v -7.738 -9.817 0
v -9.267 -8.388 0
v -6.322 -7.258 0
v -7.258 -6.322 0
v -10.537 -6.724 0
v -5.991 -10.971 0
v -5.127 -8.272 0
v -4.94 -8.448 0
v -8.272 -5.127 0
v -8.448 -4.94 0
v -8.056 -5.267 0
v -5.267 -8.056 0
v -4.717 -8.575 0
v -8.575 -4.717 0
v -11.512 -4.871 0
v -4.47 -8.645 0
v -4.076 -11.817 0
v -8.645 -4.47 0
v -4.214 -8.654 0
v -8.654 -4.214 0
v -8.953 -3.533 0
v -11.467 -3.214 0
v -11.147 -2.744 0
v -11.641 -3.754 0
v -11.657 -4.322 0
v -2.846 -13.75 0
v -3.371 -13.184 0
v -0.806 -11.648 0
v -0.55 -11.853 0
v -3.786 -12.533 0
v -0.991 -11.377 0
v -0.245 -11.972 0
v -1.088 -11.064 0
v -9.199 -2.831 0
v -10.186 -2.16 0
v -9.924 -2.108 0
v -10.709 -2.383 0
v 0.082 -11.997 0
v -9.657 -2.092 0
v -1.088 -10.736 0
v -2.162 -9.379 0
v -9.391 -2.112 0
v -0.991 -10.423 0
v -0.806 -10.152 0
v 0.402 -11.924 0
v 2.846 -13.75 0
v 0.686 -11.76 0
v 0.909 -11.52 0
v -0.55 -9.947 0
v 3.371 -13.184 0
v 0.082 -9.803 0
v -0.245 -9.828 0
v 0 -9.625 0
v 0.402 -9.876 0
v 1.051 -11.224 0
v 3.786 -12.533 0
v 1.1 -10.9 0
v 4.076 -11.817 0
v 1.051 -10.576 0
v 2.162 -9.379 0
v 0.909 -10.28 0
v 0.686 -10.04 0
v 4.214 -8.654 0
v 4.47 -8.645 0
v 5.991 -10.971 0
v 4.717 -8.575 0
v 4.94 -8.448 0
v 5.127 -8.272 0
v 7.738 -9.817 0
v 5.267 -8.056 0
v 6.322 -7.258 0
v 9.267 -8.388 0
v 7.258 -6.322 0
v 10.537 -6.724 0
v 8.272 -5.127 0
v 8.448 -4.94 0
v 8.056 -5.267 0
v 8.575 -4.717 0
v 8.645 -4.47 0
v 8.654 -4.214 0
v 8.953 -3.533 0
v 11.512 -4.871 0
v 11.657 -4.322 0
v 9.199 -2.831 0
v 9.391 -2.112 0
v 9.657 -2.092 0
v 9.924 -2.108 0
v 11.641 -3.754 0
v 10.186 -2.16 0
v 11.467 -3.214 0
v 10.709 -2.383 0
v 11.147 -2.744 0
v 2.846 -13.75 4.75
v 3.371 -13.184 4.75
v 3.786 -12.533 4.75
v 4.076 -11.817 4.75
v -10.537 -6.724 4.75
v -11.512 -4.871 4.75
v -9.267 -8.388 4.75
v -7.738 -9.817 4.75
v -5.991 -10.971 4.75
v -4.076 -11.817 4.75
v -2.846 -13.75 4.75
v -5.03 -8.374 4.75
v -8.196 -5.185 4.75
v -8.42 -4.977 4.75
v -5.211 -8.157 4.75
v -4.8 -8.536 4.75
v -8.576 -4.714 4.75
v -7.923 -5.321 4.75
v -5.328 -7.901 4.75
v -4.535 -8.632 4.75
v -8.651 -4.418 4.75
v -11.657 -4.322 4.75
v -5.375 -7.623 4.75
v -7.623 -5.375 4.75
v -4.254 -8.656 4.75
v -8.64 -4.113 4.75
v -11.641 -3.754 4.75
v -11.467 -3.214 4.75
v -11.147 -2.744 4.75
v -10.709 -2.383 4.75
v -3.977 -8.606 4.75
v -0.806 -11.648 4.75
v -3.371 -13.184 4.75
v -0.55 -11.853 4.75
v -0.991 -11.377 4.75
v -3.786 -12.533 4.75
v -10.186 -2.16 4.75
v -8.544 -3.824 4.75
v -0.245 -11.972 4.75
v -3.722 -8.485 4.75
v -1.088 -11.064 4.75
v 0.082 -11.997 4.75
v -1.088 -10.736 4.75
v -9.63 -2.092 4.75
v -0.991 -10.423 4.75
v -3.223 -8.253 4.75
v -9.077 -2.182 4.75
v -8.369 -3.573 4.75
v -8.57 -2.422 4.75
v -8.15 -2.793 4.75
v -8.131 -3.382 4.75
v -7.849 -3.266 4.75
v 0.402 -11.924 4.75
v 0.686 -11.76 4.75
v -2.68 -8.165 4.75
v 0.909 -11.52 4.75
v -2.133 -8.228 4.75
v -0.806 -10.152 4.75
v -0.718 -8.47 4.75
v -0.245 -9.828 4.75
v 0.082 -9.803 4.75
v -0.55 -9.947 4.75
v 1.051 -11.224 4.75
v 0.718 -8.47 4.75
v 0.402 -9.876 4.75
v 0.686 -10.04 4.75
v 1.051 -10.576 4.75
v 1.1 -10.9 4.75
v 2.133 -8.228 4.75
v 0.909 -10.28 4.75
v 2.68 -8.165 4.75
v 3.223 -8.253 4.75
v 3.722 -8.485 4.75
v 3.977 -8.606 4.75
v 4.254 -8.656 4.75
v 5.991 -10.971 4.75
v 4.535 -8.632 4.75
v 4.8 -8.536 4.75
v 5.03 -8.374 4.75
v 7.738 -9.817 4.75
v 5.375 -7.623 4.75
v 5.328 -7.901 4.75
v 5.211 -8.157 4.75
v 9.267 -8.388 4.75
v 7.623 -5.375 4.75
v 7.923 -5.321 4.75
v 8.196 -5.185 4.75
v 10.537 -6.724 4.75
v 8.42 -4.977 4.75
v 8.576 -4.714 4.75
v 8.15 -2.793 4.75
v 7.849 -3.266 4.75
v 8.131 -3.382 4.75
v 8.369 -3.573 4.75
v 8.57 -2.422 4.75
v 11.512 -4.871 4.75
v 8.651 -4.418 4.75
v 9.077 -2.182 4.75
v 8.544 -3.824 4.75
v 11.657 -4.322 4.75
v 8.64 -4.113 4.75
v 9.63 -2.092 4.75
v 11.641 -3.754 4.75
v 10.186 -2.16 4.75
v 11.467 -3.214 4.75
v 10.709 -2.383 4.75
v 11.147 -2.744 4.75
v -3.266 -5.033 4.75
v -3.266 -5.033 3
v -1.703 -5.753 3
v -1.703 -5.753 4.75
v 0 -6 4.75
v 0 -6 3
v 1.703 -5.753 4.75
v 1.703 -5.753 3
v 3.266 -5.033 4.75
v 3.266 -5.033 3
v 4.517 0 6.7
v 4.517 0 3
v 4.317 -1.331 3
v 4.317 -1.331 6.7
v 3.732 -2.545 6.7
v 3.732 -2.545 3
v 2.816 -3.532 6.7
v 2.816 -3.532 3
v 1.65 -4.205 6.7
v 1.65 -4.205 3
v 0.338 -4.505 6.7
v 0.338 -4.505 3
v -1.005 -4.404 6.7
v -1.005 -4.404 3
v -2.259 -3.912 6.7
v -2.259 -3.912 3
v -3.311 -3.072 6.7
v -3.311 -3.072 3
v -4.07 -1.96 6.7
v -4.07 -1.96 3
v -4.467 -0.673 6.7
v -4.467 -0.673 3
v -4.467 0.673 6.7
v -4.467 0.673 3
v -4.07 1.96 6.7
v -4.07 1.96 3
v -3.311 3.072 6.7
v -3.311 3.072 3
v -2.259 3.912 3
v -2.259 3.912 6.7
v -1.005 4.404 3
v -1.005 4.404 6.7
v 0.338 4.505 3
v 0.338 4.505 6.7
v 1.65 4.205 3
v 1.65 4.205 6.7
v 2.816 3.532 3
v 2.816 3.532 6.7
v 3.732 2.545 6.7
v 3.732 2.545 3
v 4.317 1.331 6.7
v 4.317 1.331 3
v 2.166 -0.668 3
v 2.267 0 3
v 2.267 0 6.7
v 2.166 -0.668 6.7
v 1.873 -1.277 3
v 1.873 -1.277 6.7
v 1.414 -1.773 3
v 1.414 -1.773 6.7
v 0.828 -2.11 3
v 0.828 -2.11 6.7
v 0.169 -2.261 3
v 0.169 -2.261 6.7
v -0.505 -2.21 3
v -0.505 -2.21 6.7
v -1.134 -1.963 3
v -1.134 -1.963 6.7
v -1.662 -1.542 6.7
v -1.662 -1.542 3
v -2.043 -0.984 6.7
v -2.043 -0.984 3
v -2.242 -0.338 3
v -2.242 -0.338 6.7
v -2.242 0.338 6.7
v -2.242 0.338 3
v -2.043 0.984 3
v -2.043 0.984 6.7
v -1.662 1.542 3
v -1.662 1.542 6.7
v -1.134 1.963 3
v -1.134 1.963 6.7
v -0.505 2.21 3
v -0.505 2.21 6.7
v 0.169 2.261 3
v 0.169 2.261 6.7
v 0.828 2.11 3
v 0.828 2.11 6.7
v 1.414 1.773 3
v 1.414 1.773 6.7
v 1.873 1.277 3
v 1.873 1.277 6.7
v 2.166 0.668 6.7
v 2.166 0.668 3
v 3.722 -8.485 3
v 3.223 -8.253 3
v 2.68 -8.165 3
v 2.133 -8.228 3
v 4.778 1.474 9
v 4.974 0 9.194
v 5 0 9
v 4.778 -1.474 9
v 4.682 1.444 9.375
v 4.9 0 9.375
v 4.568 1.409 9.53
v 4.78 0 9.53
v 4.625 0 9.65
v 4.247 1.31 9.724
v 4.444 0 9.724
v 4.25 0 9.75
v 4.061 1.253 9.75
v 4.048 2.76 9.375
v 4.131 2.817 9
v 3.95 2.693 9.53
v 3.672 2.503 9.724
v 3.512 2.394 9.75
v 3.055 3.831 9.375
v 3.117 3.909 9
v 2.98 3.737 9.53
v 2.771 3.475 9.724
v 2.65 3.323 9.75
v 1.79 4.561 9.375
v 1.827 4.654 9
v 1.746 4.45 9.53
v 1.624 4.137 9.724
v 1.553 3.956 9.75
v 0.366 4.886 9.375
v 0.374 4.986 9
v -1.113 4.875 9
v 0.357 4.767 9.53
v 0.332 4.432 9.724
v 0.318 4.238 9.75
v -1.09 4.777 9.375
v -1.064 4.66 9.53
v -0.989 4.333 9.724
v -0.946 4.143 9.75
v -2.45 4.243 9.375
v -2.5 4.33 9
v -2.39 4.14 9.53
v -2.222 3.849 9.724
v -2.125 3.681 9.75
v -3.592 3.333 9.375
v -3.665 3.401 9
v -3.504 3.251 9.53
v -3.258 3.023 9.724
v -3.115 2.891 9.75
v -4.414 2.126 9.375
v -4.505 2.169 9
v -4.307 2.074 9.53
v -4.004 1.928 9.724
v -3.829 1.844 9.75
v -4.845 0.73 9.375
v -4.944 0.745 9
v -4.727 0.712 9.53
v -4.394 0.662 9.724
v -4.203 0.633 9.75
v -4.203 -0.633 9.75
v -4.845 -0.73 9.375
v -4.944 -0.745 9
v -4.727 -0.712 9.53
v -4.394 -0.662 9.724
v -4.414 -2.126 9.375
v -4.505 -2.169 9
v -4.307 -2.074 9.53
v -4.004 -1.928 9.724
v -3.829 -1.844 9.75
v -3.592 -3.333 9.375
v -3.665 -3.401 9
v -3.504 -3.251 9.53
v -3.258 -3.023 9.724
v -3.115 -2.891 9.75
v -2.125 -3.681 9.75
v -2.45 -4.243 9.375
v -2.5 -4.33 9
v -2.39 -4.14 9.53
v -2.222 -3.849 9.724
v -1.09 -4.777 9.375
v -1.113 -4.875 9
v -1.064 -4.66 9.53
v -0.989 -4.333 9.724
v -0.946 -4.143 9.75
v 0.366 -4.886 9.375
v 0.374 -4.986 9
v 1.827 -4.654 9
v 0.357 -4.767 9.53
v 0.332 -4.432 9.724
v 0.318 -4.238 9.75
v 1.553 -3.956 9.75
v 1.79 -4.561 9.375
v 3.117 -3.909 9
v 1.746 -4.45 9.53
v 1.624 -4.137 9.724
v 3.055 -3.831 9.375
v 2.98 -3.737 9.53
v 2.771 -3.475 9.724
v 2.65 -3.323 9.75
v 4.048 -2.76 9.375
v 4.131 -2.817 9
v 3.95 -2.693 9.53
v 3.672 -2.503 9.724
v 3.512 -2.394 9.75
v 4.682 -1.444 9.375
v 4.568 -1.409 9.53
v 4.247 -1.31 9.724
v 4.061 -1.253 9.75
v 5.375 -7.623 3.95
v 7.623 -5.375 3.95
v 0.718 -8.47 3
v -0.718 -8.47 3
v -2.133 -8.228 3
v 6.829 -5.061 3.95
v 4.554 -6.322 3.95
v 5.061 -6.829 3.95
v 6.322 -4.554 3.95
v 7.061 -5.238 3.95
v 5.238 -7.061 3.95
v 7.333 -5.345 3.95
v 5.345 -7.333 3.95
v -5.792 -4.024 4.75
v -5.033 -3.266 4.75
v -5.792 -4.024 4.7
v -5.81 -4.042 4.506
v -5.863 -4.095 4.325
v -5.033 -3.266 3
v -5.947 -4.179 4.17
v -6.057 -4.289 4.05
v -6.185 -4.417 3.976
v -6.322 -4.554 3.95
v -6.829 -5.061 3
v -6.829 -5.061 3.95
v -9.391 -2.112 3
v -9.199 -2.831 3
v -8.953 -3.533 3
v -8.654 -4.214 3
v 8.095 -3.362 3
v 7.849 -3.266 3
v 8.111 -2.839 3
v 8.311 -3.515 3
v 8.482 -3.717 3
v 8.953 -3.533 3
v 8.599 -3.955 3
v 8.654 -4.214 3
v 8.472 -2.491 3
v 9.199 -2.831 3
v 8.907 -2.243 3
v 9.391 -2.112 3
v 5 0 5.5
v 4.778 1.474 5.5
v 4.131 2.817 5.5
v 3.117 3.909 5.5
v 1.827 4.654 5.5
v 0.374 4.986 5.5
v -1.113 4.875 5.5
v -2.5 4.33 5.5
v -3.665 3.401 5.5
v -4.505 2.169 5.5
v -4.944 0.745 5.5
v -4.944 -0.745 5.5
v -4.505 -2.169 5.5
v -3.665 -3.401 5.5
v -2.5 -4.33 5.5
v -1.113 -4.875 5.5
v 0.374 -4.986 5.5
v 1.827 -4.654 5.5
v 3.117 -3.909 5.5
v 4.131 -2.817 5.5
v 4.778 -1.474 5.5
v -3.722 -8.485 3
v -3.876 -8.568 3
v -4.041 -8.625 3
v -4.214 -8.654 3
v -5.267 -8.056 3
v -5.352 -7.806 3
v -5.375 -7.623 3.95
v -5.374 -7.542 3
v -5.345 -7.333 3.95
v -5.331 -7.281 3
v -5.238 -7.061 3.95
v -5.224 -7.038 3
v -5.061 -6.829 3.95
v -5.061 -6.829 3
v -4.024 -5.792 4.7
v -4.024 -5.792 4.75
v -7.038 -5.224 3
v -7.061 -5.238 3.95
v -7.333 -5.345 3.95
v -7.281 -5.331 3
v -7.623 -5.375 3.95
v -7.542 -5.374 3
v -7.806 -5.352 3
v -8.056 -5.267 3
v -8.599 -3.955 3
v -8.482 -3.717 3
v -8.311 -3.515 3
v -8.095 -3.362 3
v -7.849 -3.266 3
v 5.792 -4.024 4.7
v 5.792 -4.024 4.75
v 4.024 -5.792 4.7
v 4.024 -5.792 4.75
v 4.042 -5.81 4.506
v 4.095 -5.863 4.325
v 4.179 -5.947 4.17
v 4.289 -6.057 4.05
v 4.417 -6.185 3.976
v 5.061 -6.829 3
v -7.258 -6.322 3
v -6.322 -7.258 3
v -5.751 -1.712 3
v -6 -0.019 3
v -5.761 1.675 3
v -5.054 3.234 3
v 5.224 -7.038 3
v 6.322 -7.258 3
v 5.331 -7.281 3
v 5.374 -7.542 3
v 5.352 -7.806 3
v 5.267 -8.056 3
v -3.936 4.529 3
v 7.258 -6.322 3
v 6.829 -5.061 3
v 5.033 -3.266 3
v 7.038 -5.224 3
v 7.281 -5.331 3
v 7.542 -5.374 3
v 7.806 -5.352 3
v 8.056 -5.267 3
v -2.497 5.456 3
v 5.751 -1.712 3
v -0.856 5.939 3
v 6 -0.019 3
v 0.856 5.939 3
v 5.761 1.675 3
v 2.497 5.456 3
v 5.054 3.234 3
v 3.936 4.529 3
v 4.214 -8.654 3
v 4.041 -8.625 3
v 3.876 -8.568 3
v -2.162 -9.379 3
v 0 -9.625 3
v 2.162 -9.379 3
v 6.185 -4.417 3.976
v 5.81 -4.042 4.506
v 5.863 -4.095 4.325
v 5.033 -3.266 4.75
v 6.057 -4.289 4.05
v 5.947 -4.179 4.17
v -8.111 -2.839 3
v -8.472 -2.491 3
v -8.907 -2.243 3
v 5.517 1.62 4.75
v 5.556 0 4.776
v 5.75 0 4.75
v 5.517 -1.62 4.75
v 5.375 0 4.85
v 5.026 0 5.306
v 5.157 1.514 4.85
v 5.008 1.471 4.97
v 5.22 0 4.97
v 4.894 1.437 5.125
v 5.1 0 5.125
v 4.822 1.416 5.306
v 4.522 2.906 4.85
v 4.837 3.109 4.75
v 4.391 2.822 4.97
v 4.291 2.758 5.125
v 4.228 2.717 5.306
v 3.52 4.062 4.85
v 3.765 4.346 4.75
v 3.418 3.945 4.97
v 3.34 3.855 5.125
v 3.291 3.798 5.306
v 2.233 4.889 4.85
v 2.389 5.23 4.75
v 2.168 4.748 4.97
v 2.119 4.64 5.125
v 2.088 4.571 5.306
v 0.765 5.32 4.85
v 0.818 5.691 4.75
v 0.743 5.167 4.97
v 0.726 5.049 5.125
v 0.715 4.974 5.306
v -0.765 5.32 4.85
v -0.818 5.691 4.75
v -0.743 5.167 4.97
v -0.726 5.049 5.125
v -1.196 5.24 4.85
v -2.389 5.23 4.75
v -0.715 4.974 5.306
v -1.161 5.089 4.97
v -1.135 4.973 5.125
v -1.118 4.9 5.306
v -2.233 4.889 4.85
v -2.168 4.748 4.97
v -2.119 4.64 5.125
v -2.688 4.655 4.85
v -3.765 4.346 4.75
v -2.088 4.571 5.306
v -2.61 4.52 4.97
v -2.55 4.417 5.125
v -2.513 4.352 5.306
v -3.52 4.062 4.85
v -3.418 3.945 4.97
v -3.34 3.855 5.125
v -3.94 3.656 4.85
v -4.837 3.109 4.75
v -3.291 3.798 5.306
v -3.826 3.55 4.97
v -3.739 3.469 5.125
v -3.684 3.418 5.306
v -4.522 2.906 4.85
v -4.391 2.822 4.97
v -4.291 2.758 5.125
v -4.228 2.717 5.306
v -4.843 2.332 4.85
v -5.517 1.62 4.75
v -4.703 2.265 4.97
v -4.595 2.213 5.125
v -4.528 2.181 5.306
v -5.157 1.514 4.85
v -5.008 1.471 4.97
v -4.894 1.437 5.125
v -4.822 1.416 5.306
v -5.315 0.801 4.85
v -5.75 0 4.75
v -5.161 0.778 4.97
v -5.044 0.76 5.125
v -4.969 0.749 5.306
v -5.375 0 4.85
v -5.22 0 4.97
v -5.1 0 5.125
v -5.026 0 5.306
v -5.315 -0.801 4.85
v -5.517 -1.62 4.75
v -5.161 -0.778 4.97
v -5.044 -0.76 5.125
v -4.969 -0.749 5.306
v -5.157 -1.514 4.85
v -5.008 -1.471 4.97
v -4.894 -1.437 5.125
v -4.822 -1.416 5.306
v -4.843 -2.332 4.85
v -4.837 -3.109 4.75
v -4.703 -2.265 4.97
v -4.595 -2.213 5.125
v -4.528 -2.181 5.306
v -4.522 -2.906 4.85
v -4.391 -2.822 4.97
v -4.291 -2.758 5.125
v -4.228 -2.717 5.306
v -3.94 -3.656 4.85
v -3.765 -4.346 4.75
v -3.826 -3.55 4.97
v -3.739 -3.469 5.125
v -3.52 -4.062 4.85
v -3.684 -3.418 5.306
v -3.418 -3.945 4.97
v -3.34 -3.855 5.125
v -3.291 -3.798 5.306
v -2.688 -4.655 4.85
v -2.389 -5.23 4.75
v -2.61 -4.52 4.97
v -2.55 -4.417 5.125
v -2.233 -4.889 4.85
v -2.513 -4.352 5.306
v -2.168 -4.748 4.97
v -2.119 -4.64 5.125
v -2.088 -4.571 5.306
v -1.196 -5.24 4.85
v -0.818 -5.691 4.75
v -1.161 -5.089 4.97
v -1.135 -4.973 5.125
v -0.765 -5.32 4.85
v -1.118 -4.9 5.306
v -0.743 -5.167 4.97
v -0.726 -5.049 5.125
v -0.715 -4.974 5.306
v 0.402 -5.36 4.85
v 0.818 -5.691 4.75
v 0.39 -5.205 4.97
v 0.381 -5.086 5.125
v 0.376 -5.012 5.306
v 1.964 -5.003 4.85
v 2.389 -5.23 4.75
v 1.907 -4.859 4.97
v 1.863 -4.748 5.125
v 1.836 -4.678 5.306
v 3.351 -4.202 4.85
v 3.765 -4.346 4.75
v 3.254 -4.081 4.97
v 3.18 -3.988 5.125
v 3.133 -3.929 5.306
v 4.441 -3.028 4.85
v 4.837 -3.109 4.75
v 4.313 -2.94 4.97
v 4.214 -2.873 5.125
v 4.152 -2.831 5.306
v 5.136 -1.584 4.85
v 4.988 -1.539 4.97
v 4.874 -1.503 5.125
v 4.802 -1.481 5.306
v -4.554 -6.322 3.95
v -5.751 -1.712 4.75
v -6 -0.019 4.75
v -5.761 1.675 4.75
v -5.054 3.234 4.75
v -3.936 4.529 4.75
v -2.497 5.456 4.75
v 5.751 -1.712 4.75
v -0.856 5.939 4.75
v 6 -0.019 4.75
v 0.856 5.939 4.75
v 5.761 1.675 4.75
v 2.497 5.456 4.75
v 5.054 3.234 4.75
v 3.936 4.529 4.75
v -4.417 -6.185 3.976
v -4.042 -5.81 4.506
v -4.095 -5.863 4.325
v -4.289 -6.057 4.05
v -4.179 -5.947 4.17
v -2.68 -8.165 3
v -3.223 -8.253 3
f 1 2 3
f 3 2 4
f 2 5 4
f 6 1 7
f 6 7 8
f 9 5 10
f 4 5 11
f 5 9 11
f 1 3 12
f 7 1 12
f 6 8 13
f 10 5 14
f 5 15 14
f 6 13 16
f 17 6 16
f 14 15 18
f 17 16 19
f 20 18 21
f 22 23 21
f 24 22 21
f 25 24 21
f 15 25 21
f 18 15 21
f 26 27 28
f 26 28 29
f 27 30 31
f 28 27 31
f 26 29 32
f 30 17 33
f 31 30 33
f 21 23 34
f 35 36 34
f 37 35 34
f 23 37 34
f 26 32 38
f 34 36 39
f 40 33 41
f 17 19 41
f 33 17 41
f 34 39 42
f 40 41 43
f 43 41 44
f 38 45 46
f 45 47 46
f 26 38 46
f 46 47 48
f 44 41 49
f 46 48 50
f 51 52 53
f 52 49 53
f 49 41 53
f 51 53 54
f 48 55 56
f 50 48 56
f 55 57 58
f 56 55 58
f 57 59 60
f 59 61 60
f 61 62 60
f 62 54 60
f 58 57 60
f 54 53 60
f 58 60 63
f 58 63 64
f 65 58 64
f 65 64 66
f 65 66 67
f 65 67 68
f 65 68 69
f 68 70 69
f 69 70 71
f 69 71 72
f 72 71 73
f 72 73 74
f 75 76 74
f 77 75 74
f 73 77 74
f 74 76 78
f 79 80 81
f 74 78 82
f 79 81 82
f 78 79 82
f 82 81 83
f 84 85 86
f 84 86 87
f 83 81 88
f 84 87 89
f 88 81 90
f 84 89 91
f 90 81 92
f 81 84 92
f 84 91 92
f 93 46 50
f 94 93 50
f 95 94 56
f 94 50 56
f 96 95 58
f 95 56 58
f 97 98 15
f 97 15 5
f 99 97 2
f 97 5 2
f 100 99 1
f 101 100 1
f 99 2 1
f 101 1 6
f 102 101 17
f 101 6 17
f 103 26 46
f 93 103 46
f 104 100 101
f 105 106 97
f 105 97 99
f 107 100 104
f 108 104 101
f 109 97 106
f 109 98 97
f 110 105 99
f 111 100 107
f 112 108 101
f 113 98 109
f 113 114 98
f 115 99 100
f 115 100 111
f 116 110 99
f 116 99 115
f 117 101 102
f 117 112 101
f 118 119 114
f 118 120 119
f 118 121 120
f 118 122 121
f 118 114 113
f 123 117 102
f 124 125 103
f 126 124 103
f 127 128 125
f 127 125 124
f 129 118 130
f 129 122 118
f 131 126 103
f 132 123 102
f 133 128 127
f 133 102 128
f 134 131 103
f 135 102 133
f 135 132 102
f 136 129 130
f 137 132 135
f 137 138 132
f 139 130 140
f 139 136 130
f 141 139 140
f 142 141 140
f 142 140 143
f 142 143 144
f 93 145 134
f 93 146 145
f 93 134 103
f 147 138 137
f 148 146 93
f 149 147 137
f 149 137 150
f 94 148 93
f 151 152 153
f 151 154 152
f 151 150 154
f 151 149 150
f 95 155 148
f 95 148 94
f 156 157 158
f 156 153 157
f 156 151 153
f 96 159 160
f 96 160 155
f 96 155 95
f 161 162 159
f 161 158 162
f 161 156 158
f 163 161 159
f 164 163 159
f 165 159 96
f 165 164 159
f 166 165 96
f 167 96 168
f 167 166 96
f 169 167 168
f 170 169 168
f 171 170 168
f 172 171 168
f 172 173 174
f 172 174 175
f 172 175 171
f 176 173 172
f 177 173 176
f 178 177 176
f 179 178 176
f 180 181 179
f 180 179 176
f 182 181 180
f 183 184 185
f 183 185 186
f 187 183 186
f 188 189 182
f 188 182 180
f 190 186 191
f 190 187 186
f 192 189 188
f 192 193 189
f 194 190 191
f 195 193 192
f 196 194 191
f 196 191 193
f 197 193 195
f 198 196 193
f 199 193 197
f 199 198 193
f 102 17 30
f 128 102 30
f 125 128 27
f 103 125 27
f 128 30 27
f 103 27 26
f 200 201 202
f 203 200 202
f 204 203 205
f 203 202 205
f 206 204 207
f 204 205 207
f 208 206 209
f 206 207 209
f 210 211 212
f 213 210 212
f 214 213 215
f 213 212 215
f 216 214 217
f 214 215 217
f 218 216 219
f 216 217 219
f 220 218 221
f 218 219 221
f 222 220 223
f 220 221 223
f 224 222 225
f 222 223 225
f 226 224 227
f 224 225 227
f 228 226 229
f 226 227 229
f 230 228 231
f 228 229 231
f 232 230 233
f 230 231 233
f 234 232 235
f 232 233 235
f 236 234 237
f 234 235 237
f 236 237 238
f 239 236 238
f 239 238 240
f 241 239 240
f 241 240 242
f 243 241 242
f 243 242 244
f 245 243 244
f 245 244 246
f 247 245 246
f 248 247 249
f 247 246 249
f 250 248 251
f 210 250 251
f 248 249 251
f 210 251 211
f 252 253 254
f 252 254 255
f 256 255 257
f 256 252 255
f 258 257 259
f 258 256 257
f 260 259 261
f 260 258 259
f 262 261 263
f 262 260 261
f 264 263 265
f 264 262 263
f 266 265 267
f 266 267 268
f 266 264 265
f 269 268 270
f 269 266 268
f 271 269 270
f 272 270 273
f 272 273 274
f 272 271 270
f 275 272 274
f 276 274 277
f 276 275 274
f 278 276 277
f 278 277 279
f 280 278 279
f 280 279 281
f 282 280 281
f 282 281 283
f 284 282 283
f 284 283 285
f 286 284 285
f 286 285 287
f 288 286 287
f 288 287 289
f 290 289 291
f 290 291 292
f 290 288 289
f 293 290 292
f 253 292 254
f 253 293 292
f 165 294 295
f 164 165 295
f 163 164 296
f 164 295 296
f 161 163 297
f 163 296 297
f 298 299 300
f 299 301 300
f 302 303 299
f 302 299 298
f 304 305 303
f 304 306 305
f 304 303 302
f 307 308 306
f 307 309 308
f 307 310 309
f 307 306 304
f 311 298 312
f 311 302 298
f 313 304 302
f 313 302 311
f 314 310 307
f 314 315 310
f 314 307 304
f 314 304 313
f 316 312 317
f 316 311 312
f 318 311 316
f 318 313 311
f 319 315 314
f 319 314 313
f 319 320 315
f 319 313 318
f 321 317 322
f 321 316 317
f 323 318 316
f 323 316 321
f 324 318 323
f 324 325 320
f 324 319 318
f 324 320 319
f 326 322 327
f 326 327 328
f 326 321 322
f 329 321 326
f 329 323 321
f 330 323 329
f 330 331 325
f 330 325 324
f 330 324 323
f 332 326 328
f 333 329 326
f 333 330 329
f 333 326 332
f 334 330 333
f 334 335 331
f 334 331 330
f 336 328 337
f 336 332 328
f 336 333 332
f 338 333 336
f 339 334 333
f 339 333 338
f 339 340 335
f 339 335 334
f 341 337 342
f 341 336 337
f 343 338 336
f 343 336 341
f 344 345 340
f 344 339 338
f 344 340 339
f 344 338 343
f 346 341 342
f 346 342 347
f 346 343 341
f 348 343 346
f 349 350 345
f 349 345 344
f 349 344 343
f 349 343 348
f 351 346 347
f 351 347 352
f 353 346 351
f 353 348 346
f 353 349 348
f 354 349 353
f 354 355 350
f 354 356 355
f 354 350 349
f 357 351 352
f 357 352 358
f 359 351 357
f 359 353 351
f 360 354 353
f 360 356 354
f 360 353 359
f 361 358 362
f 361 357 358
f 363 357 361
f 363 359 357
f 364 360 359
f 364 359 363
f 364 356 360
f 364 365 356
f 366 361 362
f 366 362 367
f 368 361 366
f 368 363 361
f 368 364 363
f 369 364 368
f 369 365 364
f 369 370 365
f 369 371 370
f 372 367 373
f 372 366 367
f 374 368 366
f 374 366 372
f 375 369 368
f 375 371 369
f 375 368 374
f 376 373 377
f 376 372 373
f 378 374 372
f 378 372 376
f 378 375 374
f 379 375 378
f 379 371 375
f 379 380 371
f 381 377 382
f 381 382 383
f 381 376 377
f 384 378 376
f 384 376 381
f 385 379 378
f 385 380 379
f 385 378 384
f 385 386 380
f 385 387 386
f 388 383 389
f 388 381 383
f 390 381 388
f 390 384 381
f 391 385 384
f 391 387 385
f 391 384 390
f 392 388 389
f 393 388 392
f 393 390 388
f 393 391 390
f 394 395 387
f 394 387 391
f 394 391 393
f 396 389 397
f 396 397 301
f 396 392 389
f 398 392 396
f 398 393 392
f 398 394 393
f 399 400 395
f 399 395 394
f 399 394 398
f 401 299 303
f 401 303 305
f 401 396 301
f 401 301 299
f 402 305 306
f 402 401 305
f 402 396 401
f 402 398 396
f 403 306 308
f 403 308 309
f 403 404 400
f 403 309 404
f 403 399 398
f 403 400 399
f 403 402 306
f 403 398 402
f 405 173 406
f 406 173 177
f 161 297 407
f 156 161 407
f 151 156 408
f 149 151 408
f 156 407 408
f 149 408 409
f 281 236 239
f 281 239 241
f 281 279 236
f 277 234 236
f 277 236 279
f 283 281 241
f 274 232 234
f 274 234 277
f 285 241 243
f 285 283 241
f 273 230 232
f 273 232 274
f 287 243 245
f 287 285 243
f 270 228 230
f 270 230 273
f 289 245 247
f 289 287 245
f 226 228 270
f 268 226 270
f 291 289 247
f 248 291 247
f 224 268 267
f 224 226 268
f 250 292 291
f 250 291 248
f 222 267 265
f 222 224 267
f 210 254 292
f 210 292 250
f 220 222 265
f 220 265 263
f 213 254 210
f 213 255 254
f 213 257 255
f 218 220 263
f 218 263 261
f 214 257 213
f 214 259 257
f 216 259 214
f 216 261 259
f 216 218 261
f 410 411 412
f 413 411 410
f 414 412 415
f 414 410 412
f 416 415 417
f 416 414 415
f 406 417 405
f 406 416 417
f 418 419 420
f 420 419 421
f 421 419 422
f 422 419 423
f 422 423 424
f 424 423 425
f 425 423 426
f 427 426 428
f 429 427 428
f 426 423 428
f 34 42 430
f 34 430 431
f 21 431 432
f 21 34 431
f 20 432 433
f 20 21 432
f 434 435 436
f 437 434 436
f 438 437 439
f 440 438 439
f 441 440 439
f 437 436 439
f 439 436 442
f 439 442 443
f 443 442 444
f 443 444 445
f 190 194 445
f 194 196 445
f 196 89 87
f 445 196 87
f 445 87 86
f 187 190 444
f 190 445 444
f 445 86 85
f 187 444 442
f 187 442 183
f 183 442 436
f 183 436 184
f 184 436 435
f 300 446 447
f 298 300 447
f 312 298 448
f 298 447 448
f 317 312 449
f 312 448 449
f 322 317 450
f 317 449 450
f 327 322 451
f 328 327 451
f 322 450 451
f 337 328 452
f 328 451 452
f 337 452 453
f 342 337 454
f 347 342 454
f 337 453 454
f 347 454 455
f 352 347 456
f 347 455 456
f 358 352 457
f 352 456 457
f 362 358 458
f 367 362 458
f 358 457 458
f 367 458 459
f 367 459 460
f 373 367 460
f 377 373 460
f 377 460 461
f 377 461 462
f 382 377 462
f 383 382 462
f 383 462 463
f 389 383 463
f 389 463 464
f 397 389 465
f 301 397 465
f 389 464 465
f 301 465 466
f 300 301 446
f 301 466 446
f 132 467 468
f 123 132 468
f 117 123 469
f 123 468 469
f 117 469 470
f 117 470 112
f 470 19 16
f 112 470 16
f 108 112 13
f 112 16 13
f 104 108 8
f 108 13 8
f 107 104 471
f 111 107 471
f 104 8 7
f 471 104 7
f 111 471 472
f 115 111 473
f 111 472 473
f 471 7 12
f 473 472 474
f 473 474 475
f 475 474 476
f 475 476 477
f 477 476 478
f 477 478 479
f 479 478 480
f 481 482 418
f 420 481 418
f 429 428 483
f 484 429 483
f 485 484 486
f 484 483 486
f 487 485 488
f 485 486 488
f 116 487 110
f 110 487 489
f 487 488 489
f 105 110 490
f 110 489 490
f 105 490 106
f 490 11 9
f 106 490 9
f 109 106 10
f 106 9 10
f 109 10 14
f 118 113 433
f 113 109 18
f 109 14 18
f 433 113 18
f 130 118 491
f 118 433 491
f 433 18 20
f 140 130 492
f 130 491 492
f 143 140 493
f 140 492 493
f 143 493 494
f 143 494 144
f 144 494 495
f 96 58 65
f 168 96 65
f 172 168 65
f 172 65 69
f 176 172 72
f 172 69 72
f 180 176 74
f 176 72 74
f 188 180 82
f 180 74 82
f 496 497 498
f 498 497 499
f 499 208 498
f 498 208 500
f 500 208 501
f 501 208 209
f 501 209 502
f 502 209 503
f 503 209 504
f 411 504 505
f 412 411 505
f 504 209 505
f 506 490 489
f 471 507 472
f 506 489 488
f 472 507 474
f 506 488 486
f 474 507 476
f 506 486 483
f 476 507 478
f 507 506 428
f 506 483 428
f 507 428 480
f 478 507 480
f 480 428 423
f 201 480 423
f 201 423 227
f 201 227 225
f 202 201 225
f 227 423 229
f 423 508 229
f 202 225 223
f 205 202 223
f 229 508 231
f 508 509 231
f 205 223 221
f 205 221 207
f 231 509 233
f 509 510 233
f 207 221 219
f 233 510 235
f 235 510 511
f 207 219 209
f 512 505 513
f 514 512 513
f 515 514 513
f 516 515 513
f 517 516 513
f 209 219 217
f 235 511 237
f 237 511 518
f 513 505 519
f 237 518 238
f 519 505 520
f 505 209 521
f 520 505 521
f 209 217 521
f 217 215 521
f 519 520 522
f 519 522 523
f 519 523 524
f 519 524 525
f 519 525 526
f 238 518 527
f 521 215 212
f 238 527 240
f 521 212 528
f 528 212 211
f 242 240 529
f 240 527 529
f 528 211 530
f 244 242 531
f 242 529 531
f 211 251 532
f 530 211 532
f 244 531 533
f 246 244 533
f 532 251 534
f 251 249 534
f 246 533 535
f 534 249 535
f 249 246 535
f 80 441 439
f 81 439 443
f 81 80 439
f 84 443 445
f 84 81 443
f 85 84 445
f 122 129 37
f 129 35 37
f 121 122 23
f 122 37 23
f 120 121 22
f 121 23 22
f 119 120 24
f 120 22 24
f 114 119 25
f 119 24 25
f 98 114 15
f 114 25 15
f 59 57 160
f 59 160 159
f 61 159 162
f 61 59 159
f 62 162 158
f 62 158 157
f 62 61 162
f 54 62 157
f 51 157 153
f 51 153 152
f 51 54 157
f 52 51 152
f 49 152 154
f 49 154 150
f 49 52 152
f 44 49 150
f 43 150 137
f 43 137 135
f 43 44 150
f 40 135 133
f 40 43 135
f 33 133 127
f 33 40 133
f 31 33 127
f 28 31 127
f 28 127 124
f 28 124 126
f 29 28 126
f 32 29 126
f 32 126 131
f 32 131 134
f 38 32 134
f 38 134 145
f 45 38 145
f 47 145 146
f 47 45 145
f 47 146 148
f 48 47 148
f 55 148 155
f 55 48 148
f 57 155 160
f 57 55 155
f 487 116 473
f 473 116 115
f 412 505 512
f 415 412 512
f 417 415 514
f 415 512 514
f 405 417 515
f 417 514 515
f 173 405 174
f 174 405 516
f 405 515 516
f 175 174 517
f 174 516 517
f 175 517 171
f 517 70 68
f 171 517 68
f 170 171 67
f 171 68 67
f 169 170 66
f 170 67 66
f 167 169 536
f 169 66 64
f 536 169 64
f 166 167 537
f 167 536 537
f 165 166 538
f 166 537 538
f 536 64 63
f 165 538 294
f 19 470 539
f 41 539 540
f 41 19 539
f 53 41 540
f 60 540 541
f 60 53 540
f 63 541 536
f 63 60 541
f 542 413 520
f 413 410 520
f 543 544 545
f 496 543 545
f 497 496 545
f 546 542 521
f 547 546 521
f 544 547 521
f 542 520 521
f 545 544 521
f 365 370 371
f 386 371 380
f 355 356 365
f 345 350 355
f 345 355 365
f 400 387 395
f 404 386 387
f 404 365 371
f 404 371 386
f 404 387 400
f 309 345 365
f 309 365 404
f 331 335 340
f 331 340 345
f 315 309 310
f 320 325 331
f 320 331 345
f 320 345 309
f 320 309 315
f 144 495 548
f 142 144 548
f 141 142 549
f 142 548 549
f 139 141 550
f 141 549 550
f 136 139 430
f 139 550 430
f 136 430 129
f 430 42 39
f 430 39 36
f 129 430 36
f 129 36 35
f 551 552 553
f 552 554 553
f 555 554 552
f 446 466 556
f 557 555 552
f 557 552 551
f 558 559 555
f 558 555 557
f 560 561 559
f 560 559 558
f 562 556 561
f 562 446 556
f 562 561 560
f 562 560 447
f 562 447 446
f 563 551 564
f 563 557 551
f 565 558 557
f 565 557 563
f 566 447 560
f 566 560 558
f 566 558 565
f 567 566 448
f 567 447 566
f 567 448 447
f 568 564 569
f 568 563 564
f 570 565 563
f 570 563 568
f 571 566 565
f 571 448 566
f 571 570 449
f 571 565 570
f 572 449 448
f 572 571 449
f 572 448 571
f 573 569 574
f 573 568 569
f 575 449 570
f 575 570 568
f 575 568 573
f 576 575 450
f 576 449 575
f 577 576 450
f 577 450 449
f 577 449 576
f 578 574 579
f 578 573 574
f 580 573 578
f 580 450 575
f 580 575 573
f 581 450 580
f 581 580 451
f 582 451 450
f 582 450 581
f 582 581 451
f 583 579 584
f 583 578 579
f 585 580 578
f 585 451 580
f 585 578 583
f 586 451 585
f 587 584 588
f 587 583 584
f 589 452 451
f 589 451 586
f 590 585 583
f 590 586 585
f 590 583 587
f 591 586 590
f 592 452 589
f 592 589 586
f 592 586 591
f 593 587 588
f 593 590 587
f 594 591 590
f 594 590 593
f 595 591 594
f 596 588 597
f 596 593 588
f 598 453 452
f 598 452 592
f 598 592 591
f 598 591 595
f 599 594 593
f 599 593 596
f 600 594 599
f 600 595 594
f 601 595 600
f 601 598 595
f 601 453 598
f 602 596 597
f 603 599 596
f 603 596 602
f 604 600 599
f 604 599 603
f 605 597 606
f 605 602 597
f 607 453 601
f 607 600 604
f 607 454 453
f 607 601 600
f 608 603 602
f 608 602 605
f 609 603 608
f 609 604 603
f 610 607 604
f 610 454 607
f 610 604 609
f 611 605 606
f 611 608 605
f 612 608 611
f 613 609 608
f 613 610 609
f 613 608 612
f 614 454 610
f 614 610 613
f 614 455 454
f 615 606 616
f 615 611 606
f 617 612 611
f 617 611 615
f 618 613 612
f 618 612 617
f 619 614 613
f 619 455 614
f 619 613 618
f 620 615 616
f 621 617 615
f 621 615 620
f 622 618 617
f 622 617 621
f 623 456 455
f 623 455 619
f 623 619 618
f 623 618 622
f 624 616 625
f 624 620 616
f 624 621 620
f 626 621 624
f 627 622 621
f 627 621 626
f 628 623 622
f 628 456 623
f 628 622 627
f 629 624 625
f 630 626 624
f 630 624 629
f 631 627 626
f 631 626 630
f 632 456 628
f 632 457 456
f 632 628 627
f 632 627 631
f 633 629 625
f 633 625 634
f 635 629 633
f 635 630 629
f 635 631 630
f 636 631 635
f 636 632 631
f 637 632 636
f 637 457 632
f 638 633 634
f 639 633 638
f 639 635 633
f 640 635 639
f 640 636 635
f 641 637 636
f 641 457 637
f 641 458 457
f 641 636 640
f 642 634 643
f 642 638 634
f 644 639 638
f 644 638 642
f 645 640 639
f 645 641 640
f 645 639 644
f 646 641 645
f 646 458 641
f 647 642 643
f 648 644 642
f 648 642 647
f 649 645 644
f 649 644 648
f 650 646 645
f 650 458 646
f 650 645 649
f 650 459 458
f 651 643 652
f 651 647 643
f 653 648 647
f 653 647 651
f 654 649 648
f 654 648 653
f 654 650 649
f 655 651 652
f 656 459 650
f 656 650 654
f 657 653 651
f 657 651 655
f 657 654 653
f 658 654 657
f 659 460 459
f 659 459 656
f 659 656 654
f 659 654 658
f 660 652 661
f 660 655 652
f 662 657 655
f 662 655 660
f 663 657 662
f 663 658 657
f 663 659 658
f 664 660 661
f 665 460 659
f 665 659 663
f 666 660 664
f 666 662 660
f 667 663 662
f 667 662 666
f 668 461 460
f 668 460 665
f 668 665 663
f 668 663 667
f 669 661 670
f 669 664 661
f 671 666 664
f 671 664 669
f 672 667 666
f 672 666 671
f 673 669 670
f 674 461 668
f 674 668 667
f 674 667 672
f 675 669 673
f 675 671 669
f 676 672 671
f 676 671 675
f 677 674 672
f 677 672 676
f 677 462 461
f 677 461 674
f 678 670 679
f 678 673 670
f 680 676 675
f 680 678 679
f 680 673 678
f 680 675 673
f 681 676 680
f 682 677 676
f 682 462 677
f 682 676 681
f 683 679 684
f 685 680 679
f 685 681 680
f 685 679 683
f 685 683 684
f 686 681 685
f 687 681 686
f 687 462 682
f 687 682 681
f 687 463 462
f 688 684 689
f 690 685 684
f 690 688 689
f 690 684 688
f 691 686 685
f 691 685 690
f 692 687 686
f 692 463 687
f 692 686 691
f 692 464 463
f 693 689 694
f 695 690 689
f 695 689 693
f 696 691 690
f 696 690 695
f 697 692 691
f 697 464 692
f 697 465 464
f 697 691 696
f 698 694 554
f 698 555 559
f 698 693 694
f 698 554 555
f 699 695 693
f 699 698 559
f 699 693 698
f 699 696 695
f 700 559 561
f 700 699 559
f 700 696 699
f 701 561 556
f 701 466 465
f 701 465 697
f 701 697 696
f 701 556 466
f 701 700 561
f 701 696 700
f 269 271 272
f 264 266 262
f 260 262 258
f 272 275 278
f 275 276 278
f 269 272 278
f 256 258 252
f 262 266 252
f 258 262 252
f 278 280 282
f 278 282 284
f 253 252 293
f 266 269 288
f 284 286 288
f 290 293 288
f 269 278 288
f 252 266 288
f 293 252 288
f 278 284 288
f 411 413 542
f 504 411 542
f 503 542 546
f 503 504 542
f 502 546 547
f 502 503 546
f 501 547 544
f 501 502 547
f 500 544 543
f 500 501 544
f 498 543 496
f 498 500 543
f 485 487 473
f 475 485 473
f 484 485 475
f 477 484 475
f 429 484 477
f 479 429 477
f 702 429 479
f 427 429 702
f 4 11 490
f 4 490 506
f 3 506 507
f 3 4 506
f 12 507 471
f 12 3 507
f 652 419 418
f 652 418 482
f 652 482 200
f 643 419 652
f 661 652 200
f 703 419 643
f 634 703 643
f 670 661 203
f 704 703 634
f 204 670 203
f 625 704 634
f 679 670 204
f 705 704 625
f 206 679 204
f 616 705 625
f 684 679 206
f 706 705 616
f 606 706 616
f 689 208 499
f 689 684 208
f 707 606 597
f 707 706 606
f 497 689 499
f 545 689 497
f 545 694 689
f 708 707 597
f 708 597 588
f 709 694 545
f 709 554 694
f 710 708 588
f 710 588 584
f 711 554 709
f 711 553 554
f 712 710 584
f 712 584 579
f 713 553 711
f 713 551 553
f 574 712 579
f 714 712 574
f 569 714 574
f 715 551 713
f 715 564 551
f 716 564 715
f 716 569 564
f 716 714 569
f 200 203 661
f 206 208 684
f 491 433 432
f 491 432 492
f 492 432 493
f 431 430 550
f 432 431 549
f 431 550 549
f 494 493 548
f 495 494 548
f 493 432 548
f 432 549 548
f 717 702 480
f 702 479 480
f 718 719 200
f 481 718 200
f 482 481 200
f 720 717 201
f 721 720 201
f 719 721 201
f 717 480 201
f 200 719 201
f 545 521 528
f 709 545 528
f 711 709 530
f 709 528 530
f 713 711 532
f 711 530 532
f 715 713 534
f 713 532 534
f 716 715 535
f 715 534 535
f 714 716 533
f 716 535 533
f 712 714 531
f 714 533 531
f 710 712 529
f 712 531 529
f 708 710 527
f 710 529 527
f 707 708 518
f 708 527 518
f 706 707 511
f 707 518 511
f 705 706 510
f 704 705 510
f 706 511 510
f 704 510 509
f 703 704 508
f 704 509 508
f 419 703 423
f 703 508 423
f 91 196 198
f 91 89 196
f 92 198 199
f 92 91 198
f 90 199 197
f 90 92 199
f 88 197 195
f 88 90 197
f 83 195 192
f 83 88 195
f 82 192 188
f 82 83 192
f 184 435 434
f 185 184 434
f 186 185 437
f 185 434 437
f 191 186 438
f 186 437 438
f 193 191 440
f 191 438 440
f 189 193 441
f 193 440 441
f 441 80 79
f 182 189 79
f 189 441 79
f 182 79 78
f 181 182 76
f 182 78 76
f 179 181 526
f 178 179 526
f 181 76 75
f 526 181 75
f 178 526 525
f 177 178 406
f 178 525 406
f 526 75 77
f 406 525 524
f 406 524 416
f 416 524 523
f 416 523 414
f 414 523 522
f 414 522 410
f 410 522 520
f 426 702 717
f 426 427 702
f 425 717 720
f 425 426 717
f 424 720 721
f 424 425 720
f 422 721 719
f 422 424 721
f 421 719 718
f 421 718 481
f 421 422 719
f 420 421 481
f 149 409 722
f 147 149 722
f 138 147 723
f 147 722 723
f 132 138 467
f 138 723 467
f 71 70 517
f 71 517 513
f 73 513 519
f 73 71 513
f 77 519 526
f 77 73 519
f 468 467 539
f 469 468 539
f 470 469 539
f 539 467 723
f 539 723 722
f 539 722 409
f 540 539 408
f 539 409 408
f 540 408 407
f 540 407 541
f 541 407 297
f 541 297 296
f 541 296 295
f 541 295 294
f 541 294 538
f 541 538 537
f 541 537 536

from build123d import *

# Parameters (mm, degrees)
F0_R        = 1.1
F1_DEPTH    = 4.75
F2_R        = 5
F3_DEPTH    = 5
F5_T1_DEPTH = 16.1499020619
F5_T3_DEPTH = 14.3297238483
F5_T5_DEPTH = 10.7226436636
F7_DEPTH    = 0.8
F8_R        = 0.75
F9_R        = 9.625
F10_DEPTH   = 3
F12_R       = 4.5172071506
F12_R_2     = 2.2672071506
F13_DEPTH   = 3.7


# Not quite as in the source:
# - a fillet or chamfer that OpenCascade refuses, or shapes differently, is made with other operations: its cross-section is extruded or revolved along the edge and cut away or added


with BuildPart() as f1:
    # F0 (on Top) → F1 (new body)
    with BuildSketch(Plane.XY):
        with BuildLine():
            Line((-8.3357166343, -1.6650899635), (-12.2050748298, -2.6992866465))
            ThreePointArc((-12.2050748298, -2.6992866465), (-9.3300068577, -8.3187121621), (-4.0757746589, -11.8168549509))
            ThreePointArc((-4.0757746589, -11.8168549509), (-3.593311946, -12.8676823003), (-2.8459674038, -13.75))
            Line((-2.8459674038, -13.75), (2.8459674038, -13.75))
            ThreePointArc((2.8459674038, -13.75), (3.593311946, -12.8676823003), (4.0757746589, -11.8168549509))
            ThreePointArc((4.0757746589, -11.8168549509), (9.3300068577, -8.3187121621), (12.2050748298, -2.6992866465))
            Line((12.2050748298, -2.6992866465), (8.3357166343, -1.6650899635))
            ThreePointArc((8.3357166343, -1.6650899635), (8.1313688943, -2.4774051544), (7.8480653995, -3.2656646917))
            ThreePointArc((7.8480653995, -3.2656646917), (8.5179809488, -4.8326547168), (6.82922604, -5.061459087))
            Line((6.82922604, -5.061459087), (5.0334316447, -3.2656646917))
            ThreePointArc((5.0334316447, -3.2656646917), (0, 6), (-5.0334316447, -3.2656646917))
            Line((-5.0334316447, -3.2656646917), (-6.82922604, -5.061459087))
            ThreePointArc((-6.82922604, -5.061459087), (-8.5179809488, -4.8326547168), (-7.8480653995, -3.2656646917))
            ThreePointArc((-7.8480653995, -3.2656646917), (-8.1313688943, -2.4774051544), (-8.3357166343, -1.6650899635))
        make_face()
        with Locations((0, -10.9)):
            Circle(F0_R, mode=Mode.SUBTRACT)
        with BuildLine():
            Line((-5.061459087, -6.82922604), (-3.2656646917, -5.0334316447))
            ThreePointArc((-3.2656646917, -5.0334316447), (0, -6), (3.2656646917, -5.0334316447))
            Line((3.2656646917, -5.0334316447), (5.061459087, -6.82922604))
            ThreePointArc((5.061459087, -6.82922604), (4.8326547168, -8.5179809488), (3.2656646917, -7.8480653995))
            ThreePointArc((3.2656646917, -7.8480653995), (0, -8.5003938964), (-3.2656646917, -7.8480653995))
            ThreePointArc((-3.2656646917, -7.8480653995), (-4.8326547168, -8.5179809488), (-5.061459087, -6.82922604))
        make_face(mode=Mode.SUBTRACT)
    extrude(amount=F1_DEPTH)

    # F2 (on face) → F3 (join)
    with BuildSketch(Plane.XY.offset(4.75)):
        Circle(F2_R)
    extrude(amount=F3_DEPTH)

    # F5: fillet of radius 2 on 6 edges, made by hand

    # F5_s2 → F5_t1 (cut)
    with BuildSketch(Plane.XY.offset(-5.6999510309)):
        with BuildLine():
            ThreePointArc((10.1863028618, -2.1597120795), (11.4666976063, -3.2135797735), (11.5117544763, -4.871294374))
            ThreePointArc((11.5117544763, -4.871294374), (11.9080394052, -3.801131085), (12.2050748298, -2.6992866465))
            Line((12.2050748298, -2.6992866465), (10.1863028618, -2.1597120795))
        make_face()
        with BuildLine():
            ThreePointArc((-10.1863028618, -2.1597120795), (-11.4666976063, -3.2135797735), (-11.5117544763, -4.871294374))
            ThreePointArc((-11.5117544763, -4.871294374), (-11.9080394052, -3.801131085), (-12.2050748298, -2.6992866465))
            Line((-12.2050748298, -2.6992866465), (-10.1863028618, -2.1597120795))
        make_face()
    extrude(amount=F5_T1_DEPTH, mode=Mode.SUBTRACT)

    # F5_s4 → F5_t3 (cut)
    with BuildSketch(Plane.XY.offset(-4.7898619242)):
        with BuildLine():
            ThreePointArc((10.1866871135, -2.1598147817), (8.7919457915, -2.2951684372), (7.8283732011, -3.3125925525))
            ThreePointArc((7.8283732011, -3.3125925525), (8.1239163121, -2.5017354271), (8.3357166343, -1.6650899635))
            Line((8.3357166343, -1.6650899635), (10.1866871135, -2.1598147817))
        make_face()
        with BuildLine():
            ThreePointArc((-7.8283732011, -3.3125925525), (-8.7919457915, -2.2951684372), (-10.1866871135, -2.1598147817))
            Line((-10.1866871135, -2.1598147817), (-8.3357166343, -1.6650899635))
            ThreePointArc((-8.3357166343, -1.6650899635), (-8.1239163121, -2.5017354271), (-7.8283732011, -3.3125925525))
        make_face()
    extrude(amount=F5_T3_DEPTH, mode=Mode.SUBTRACT)

    # F5_s6 → F5_t5 (cut)
    with BuildSketch(Plane.XY.offset(-2.9863218318)):
        with BuildLine():
            ThreePointArc((3.7221531416, -8.4854887571), (2.954728203, -8.190033245), (2.1332864048, -8.2283525392))
            ThreePointArc((2.1332864048, -8.2283525392), (2.7061638555, -8.0581246938), (3.2656646917, -7.8480653995))
            ThreePointArc((3.2656646917, -7.8480653995), (3.4334814116, -8.2100520192), (3.7221531416, -8.4854887571))
        make_face()
        with BuildLine():
            ThreePointArc((-2.1332864048, -8.2283525392), (-2.954728203, -8.190033245), (-3.7221531416, -8.4854887571))
            ThreePointArc((-3.7221531416, -8.4854887571), (-3.4334814116, -8.2100520192), (-3.2656646917, -7.8480653995))
            ThreePointArc((-3.2656646917, -7.8480653995), (-2.7061638555, -8.0581246938), (-2.1332864048, -8.2283525392))
        make_face()
    extrude(amount=F5_T5_DEPTH, mode=Mode.SUBTRACT)

    # F6 (on face) → F7 (cut)
    with BuildSketch(Plane.XY.offset(4.75)):
        Polygon((4.377220794, -8.6198614811), (8.6198614811, -4.377220794), (7.0098197866, -2.8055128878), (2.7863459937, -7.0289866808), align=None)
        Polygon((-4.377220794, -8.6198614811), (-2.7863459937, -7.0289866808), (-7.0098197866, -2.8055128878), (-8.6198614811, -4.377220794), align=None)
    extrude(amount=-F7_DEPTH, mode=Mode.SUBTRACT)

    # F8
    f8_edges = [f1.edges().sort_by_distance(p)[0] for p in [
        (4.907666, -4.907666, 3.95),
        (-4.907666, -4.907666, 3.95),
        (-5, 0, 4.75),
        (-5, 0, 9.75),
    ]]
    fillet(f8_edges, radius=F8_R)

    # F9 (on Top) → F10 (cut)
    with BuildSketch(Plane.XY):
        Circle(F9_R)
    extrude(amount=F10_DEPTH, mode=Mode.SUBTRACT)

    # F12 (on face) → F13 (cut)
    with BuildSketch(Plane(origin=(0, 0, 3), x_dir=(1, 0, 0), z_dir=(0, 0, -1))):
        Circle(F12_R)
        Circle(F12_R_2, mode=Mode.SUBTRACT)
    extrude(amount=-F13_DEPTH, mode=Mode.SUBTRACT)


solid = f1.part
